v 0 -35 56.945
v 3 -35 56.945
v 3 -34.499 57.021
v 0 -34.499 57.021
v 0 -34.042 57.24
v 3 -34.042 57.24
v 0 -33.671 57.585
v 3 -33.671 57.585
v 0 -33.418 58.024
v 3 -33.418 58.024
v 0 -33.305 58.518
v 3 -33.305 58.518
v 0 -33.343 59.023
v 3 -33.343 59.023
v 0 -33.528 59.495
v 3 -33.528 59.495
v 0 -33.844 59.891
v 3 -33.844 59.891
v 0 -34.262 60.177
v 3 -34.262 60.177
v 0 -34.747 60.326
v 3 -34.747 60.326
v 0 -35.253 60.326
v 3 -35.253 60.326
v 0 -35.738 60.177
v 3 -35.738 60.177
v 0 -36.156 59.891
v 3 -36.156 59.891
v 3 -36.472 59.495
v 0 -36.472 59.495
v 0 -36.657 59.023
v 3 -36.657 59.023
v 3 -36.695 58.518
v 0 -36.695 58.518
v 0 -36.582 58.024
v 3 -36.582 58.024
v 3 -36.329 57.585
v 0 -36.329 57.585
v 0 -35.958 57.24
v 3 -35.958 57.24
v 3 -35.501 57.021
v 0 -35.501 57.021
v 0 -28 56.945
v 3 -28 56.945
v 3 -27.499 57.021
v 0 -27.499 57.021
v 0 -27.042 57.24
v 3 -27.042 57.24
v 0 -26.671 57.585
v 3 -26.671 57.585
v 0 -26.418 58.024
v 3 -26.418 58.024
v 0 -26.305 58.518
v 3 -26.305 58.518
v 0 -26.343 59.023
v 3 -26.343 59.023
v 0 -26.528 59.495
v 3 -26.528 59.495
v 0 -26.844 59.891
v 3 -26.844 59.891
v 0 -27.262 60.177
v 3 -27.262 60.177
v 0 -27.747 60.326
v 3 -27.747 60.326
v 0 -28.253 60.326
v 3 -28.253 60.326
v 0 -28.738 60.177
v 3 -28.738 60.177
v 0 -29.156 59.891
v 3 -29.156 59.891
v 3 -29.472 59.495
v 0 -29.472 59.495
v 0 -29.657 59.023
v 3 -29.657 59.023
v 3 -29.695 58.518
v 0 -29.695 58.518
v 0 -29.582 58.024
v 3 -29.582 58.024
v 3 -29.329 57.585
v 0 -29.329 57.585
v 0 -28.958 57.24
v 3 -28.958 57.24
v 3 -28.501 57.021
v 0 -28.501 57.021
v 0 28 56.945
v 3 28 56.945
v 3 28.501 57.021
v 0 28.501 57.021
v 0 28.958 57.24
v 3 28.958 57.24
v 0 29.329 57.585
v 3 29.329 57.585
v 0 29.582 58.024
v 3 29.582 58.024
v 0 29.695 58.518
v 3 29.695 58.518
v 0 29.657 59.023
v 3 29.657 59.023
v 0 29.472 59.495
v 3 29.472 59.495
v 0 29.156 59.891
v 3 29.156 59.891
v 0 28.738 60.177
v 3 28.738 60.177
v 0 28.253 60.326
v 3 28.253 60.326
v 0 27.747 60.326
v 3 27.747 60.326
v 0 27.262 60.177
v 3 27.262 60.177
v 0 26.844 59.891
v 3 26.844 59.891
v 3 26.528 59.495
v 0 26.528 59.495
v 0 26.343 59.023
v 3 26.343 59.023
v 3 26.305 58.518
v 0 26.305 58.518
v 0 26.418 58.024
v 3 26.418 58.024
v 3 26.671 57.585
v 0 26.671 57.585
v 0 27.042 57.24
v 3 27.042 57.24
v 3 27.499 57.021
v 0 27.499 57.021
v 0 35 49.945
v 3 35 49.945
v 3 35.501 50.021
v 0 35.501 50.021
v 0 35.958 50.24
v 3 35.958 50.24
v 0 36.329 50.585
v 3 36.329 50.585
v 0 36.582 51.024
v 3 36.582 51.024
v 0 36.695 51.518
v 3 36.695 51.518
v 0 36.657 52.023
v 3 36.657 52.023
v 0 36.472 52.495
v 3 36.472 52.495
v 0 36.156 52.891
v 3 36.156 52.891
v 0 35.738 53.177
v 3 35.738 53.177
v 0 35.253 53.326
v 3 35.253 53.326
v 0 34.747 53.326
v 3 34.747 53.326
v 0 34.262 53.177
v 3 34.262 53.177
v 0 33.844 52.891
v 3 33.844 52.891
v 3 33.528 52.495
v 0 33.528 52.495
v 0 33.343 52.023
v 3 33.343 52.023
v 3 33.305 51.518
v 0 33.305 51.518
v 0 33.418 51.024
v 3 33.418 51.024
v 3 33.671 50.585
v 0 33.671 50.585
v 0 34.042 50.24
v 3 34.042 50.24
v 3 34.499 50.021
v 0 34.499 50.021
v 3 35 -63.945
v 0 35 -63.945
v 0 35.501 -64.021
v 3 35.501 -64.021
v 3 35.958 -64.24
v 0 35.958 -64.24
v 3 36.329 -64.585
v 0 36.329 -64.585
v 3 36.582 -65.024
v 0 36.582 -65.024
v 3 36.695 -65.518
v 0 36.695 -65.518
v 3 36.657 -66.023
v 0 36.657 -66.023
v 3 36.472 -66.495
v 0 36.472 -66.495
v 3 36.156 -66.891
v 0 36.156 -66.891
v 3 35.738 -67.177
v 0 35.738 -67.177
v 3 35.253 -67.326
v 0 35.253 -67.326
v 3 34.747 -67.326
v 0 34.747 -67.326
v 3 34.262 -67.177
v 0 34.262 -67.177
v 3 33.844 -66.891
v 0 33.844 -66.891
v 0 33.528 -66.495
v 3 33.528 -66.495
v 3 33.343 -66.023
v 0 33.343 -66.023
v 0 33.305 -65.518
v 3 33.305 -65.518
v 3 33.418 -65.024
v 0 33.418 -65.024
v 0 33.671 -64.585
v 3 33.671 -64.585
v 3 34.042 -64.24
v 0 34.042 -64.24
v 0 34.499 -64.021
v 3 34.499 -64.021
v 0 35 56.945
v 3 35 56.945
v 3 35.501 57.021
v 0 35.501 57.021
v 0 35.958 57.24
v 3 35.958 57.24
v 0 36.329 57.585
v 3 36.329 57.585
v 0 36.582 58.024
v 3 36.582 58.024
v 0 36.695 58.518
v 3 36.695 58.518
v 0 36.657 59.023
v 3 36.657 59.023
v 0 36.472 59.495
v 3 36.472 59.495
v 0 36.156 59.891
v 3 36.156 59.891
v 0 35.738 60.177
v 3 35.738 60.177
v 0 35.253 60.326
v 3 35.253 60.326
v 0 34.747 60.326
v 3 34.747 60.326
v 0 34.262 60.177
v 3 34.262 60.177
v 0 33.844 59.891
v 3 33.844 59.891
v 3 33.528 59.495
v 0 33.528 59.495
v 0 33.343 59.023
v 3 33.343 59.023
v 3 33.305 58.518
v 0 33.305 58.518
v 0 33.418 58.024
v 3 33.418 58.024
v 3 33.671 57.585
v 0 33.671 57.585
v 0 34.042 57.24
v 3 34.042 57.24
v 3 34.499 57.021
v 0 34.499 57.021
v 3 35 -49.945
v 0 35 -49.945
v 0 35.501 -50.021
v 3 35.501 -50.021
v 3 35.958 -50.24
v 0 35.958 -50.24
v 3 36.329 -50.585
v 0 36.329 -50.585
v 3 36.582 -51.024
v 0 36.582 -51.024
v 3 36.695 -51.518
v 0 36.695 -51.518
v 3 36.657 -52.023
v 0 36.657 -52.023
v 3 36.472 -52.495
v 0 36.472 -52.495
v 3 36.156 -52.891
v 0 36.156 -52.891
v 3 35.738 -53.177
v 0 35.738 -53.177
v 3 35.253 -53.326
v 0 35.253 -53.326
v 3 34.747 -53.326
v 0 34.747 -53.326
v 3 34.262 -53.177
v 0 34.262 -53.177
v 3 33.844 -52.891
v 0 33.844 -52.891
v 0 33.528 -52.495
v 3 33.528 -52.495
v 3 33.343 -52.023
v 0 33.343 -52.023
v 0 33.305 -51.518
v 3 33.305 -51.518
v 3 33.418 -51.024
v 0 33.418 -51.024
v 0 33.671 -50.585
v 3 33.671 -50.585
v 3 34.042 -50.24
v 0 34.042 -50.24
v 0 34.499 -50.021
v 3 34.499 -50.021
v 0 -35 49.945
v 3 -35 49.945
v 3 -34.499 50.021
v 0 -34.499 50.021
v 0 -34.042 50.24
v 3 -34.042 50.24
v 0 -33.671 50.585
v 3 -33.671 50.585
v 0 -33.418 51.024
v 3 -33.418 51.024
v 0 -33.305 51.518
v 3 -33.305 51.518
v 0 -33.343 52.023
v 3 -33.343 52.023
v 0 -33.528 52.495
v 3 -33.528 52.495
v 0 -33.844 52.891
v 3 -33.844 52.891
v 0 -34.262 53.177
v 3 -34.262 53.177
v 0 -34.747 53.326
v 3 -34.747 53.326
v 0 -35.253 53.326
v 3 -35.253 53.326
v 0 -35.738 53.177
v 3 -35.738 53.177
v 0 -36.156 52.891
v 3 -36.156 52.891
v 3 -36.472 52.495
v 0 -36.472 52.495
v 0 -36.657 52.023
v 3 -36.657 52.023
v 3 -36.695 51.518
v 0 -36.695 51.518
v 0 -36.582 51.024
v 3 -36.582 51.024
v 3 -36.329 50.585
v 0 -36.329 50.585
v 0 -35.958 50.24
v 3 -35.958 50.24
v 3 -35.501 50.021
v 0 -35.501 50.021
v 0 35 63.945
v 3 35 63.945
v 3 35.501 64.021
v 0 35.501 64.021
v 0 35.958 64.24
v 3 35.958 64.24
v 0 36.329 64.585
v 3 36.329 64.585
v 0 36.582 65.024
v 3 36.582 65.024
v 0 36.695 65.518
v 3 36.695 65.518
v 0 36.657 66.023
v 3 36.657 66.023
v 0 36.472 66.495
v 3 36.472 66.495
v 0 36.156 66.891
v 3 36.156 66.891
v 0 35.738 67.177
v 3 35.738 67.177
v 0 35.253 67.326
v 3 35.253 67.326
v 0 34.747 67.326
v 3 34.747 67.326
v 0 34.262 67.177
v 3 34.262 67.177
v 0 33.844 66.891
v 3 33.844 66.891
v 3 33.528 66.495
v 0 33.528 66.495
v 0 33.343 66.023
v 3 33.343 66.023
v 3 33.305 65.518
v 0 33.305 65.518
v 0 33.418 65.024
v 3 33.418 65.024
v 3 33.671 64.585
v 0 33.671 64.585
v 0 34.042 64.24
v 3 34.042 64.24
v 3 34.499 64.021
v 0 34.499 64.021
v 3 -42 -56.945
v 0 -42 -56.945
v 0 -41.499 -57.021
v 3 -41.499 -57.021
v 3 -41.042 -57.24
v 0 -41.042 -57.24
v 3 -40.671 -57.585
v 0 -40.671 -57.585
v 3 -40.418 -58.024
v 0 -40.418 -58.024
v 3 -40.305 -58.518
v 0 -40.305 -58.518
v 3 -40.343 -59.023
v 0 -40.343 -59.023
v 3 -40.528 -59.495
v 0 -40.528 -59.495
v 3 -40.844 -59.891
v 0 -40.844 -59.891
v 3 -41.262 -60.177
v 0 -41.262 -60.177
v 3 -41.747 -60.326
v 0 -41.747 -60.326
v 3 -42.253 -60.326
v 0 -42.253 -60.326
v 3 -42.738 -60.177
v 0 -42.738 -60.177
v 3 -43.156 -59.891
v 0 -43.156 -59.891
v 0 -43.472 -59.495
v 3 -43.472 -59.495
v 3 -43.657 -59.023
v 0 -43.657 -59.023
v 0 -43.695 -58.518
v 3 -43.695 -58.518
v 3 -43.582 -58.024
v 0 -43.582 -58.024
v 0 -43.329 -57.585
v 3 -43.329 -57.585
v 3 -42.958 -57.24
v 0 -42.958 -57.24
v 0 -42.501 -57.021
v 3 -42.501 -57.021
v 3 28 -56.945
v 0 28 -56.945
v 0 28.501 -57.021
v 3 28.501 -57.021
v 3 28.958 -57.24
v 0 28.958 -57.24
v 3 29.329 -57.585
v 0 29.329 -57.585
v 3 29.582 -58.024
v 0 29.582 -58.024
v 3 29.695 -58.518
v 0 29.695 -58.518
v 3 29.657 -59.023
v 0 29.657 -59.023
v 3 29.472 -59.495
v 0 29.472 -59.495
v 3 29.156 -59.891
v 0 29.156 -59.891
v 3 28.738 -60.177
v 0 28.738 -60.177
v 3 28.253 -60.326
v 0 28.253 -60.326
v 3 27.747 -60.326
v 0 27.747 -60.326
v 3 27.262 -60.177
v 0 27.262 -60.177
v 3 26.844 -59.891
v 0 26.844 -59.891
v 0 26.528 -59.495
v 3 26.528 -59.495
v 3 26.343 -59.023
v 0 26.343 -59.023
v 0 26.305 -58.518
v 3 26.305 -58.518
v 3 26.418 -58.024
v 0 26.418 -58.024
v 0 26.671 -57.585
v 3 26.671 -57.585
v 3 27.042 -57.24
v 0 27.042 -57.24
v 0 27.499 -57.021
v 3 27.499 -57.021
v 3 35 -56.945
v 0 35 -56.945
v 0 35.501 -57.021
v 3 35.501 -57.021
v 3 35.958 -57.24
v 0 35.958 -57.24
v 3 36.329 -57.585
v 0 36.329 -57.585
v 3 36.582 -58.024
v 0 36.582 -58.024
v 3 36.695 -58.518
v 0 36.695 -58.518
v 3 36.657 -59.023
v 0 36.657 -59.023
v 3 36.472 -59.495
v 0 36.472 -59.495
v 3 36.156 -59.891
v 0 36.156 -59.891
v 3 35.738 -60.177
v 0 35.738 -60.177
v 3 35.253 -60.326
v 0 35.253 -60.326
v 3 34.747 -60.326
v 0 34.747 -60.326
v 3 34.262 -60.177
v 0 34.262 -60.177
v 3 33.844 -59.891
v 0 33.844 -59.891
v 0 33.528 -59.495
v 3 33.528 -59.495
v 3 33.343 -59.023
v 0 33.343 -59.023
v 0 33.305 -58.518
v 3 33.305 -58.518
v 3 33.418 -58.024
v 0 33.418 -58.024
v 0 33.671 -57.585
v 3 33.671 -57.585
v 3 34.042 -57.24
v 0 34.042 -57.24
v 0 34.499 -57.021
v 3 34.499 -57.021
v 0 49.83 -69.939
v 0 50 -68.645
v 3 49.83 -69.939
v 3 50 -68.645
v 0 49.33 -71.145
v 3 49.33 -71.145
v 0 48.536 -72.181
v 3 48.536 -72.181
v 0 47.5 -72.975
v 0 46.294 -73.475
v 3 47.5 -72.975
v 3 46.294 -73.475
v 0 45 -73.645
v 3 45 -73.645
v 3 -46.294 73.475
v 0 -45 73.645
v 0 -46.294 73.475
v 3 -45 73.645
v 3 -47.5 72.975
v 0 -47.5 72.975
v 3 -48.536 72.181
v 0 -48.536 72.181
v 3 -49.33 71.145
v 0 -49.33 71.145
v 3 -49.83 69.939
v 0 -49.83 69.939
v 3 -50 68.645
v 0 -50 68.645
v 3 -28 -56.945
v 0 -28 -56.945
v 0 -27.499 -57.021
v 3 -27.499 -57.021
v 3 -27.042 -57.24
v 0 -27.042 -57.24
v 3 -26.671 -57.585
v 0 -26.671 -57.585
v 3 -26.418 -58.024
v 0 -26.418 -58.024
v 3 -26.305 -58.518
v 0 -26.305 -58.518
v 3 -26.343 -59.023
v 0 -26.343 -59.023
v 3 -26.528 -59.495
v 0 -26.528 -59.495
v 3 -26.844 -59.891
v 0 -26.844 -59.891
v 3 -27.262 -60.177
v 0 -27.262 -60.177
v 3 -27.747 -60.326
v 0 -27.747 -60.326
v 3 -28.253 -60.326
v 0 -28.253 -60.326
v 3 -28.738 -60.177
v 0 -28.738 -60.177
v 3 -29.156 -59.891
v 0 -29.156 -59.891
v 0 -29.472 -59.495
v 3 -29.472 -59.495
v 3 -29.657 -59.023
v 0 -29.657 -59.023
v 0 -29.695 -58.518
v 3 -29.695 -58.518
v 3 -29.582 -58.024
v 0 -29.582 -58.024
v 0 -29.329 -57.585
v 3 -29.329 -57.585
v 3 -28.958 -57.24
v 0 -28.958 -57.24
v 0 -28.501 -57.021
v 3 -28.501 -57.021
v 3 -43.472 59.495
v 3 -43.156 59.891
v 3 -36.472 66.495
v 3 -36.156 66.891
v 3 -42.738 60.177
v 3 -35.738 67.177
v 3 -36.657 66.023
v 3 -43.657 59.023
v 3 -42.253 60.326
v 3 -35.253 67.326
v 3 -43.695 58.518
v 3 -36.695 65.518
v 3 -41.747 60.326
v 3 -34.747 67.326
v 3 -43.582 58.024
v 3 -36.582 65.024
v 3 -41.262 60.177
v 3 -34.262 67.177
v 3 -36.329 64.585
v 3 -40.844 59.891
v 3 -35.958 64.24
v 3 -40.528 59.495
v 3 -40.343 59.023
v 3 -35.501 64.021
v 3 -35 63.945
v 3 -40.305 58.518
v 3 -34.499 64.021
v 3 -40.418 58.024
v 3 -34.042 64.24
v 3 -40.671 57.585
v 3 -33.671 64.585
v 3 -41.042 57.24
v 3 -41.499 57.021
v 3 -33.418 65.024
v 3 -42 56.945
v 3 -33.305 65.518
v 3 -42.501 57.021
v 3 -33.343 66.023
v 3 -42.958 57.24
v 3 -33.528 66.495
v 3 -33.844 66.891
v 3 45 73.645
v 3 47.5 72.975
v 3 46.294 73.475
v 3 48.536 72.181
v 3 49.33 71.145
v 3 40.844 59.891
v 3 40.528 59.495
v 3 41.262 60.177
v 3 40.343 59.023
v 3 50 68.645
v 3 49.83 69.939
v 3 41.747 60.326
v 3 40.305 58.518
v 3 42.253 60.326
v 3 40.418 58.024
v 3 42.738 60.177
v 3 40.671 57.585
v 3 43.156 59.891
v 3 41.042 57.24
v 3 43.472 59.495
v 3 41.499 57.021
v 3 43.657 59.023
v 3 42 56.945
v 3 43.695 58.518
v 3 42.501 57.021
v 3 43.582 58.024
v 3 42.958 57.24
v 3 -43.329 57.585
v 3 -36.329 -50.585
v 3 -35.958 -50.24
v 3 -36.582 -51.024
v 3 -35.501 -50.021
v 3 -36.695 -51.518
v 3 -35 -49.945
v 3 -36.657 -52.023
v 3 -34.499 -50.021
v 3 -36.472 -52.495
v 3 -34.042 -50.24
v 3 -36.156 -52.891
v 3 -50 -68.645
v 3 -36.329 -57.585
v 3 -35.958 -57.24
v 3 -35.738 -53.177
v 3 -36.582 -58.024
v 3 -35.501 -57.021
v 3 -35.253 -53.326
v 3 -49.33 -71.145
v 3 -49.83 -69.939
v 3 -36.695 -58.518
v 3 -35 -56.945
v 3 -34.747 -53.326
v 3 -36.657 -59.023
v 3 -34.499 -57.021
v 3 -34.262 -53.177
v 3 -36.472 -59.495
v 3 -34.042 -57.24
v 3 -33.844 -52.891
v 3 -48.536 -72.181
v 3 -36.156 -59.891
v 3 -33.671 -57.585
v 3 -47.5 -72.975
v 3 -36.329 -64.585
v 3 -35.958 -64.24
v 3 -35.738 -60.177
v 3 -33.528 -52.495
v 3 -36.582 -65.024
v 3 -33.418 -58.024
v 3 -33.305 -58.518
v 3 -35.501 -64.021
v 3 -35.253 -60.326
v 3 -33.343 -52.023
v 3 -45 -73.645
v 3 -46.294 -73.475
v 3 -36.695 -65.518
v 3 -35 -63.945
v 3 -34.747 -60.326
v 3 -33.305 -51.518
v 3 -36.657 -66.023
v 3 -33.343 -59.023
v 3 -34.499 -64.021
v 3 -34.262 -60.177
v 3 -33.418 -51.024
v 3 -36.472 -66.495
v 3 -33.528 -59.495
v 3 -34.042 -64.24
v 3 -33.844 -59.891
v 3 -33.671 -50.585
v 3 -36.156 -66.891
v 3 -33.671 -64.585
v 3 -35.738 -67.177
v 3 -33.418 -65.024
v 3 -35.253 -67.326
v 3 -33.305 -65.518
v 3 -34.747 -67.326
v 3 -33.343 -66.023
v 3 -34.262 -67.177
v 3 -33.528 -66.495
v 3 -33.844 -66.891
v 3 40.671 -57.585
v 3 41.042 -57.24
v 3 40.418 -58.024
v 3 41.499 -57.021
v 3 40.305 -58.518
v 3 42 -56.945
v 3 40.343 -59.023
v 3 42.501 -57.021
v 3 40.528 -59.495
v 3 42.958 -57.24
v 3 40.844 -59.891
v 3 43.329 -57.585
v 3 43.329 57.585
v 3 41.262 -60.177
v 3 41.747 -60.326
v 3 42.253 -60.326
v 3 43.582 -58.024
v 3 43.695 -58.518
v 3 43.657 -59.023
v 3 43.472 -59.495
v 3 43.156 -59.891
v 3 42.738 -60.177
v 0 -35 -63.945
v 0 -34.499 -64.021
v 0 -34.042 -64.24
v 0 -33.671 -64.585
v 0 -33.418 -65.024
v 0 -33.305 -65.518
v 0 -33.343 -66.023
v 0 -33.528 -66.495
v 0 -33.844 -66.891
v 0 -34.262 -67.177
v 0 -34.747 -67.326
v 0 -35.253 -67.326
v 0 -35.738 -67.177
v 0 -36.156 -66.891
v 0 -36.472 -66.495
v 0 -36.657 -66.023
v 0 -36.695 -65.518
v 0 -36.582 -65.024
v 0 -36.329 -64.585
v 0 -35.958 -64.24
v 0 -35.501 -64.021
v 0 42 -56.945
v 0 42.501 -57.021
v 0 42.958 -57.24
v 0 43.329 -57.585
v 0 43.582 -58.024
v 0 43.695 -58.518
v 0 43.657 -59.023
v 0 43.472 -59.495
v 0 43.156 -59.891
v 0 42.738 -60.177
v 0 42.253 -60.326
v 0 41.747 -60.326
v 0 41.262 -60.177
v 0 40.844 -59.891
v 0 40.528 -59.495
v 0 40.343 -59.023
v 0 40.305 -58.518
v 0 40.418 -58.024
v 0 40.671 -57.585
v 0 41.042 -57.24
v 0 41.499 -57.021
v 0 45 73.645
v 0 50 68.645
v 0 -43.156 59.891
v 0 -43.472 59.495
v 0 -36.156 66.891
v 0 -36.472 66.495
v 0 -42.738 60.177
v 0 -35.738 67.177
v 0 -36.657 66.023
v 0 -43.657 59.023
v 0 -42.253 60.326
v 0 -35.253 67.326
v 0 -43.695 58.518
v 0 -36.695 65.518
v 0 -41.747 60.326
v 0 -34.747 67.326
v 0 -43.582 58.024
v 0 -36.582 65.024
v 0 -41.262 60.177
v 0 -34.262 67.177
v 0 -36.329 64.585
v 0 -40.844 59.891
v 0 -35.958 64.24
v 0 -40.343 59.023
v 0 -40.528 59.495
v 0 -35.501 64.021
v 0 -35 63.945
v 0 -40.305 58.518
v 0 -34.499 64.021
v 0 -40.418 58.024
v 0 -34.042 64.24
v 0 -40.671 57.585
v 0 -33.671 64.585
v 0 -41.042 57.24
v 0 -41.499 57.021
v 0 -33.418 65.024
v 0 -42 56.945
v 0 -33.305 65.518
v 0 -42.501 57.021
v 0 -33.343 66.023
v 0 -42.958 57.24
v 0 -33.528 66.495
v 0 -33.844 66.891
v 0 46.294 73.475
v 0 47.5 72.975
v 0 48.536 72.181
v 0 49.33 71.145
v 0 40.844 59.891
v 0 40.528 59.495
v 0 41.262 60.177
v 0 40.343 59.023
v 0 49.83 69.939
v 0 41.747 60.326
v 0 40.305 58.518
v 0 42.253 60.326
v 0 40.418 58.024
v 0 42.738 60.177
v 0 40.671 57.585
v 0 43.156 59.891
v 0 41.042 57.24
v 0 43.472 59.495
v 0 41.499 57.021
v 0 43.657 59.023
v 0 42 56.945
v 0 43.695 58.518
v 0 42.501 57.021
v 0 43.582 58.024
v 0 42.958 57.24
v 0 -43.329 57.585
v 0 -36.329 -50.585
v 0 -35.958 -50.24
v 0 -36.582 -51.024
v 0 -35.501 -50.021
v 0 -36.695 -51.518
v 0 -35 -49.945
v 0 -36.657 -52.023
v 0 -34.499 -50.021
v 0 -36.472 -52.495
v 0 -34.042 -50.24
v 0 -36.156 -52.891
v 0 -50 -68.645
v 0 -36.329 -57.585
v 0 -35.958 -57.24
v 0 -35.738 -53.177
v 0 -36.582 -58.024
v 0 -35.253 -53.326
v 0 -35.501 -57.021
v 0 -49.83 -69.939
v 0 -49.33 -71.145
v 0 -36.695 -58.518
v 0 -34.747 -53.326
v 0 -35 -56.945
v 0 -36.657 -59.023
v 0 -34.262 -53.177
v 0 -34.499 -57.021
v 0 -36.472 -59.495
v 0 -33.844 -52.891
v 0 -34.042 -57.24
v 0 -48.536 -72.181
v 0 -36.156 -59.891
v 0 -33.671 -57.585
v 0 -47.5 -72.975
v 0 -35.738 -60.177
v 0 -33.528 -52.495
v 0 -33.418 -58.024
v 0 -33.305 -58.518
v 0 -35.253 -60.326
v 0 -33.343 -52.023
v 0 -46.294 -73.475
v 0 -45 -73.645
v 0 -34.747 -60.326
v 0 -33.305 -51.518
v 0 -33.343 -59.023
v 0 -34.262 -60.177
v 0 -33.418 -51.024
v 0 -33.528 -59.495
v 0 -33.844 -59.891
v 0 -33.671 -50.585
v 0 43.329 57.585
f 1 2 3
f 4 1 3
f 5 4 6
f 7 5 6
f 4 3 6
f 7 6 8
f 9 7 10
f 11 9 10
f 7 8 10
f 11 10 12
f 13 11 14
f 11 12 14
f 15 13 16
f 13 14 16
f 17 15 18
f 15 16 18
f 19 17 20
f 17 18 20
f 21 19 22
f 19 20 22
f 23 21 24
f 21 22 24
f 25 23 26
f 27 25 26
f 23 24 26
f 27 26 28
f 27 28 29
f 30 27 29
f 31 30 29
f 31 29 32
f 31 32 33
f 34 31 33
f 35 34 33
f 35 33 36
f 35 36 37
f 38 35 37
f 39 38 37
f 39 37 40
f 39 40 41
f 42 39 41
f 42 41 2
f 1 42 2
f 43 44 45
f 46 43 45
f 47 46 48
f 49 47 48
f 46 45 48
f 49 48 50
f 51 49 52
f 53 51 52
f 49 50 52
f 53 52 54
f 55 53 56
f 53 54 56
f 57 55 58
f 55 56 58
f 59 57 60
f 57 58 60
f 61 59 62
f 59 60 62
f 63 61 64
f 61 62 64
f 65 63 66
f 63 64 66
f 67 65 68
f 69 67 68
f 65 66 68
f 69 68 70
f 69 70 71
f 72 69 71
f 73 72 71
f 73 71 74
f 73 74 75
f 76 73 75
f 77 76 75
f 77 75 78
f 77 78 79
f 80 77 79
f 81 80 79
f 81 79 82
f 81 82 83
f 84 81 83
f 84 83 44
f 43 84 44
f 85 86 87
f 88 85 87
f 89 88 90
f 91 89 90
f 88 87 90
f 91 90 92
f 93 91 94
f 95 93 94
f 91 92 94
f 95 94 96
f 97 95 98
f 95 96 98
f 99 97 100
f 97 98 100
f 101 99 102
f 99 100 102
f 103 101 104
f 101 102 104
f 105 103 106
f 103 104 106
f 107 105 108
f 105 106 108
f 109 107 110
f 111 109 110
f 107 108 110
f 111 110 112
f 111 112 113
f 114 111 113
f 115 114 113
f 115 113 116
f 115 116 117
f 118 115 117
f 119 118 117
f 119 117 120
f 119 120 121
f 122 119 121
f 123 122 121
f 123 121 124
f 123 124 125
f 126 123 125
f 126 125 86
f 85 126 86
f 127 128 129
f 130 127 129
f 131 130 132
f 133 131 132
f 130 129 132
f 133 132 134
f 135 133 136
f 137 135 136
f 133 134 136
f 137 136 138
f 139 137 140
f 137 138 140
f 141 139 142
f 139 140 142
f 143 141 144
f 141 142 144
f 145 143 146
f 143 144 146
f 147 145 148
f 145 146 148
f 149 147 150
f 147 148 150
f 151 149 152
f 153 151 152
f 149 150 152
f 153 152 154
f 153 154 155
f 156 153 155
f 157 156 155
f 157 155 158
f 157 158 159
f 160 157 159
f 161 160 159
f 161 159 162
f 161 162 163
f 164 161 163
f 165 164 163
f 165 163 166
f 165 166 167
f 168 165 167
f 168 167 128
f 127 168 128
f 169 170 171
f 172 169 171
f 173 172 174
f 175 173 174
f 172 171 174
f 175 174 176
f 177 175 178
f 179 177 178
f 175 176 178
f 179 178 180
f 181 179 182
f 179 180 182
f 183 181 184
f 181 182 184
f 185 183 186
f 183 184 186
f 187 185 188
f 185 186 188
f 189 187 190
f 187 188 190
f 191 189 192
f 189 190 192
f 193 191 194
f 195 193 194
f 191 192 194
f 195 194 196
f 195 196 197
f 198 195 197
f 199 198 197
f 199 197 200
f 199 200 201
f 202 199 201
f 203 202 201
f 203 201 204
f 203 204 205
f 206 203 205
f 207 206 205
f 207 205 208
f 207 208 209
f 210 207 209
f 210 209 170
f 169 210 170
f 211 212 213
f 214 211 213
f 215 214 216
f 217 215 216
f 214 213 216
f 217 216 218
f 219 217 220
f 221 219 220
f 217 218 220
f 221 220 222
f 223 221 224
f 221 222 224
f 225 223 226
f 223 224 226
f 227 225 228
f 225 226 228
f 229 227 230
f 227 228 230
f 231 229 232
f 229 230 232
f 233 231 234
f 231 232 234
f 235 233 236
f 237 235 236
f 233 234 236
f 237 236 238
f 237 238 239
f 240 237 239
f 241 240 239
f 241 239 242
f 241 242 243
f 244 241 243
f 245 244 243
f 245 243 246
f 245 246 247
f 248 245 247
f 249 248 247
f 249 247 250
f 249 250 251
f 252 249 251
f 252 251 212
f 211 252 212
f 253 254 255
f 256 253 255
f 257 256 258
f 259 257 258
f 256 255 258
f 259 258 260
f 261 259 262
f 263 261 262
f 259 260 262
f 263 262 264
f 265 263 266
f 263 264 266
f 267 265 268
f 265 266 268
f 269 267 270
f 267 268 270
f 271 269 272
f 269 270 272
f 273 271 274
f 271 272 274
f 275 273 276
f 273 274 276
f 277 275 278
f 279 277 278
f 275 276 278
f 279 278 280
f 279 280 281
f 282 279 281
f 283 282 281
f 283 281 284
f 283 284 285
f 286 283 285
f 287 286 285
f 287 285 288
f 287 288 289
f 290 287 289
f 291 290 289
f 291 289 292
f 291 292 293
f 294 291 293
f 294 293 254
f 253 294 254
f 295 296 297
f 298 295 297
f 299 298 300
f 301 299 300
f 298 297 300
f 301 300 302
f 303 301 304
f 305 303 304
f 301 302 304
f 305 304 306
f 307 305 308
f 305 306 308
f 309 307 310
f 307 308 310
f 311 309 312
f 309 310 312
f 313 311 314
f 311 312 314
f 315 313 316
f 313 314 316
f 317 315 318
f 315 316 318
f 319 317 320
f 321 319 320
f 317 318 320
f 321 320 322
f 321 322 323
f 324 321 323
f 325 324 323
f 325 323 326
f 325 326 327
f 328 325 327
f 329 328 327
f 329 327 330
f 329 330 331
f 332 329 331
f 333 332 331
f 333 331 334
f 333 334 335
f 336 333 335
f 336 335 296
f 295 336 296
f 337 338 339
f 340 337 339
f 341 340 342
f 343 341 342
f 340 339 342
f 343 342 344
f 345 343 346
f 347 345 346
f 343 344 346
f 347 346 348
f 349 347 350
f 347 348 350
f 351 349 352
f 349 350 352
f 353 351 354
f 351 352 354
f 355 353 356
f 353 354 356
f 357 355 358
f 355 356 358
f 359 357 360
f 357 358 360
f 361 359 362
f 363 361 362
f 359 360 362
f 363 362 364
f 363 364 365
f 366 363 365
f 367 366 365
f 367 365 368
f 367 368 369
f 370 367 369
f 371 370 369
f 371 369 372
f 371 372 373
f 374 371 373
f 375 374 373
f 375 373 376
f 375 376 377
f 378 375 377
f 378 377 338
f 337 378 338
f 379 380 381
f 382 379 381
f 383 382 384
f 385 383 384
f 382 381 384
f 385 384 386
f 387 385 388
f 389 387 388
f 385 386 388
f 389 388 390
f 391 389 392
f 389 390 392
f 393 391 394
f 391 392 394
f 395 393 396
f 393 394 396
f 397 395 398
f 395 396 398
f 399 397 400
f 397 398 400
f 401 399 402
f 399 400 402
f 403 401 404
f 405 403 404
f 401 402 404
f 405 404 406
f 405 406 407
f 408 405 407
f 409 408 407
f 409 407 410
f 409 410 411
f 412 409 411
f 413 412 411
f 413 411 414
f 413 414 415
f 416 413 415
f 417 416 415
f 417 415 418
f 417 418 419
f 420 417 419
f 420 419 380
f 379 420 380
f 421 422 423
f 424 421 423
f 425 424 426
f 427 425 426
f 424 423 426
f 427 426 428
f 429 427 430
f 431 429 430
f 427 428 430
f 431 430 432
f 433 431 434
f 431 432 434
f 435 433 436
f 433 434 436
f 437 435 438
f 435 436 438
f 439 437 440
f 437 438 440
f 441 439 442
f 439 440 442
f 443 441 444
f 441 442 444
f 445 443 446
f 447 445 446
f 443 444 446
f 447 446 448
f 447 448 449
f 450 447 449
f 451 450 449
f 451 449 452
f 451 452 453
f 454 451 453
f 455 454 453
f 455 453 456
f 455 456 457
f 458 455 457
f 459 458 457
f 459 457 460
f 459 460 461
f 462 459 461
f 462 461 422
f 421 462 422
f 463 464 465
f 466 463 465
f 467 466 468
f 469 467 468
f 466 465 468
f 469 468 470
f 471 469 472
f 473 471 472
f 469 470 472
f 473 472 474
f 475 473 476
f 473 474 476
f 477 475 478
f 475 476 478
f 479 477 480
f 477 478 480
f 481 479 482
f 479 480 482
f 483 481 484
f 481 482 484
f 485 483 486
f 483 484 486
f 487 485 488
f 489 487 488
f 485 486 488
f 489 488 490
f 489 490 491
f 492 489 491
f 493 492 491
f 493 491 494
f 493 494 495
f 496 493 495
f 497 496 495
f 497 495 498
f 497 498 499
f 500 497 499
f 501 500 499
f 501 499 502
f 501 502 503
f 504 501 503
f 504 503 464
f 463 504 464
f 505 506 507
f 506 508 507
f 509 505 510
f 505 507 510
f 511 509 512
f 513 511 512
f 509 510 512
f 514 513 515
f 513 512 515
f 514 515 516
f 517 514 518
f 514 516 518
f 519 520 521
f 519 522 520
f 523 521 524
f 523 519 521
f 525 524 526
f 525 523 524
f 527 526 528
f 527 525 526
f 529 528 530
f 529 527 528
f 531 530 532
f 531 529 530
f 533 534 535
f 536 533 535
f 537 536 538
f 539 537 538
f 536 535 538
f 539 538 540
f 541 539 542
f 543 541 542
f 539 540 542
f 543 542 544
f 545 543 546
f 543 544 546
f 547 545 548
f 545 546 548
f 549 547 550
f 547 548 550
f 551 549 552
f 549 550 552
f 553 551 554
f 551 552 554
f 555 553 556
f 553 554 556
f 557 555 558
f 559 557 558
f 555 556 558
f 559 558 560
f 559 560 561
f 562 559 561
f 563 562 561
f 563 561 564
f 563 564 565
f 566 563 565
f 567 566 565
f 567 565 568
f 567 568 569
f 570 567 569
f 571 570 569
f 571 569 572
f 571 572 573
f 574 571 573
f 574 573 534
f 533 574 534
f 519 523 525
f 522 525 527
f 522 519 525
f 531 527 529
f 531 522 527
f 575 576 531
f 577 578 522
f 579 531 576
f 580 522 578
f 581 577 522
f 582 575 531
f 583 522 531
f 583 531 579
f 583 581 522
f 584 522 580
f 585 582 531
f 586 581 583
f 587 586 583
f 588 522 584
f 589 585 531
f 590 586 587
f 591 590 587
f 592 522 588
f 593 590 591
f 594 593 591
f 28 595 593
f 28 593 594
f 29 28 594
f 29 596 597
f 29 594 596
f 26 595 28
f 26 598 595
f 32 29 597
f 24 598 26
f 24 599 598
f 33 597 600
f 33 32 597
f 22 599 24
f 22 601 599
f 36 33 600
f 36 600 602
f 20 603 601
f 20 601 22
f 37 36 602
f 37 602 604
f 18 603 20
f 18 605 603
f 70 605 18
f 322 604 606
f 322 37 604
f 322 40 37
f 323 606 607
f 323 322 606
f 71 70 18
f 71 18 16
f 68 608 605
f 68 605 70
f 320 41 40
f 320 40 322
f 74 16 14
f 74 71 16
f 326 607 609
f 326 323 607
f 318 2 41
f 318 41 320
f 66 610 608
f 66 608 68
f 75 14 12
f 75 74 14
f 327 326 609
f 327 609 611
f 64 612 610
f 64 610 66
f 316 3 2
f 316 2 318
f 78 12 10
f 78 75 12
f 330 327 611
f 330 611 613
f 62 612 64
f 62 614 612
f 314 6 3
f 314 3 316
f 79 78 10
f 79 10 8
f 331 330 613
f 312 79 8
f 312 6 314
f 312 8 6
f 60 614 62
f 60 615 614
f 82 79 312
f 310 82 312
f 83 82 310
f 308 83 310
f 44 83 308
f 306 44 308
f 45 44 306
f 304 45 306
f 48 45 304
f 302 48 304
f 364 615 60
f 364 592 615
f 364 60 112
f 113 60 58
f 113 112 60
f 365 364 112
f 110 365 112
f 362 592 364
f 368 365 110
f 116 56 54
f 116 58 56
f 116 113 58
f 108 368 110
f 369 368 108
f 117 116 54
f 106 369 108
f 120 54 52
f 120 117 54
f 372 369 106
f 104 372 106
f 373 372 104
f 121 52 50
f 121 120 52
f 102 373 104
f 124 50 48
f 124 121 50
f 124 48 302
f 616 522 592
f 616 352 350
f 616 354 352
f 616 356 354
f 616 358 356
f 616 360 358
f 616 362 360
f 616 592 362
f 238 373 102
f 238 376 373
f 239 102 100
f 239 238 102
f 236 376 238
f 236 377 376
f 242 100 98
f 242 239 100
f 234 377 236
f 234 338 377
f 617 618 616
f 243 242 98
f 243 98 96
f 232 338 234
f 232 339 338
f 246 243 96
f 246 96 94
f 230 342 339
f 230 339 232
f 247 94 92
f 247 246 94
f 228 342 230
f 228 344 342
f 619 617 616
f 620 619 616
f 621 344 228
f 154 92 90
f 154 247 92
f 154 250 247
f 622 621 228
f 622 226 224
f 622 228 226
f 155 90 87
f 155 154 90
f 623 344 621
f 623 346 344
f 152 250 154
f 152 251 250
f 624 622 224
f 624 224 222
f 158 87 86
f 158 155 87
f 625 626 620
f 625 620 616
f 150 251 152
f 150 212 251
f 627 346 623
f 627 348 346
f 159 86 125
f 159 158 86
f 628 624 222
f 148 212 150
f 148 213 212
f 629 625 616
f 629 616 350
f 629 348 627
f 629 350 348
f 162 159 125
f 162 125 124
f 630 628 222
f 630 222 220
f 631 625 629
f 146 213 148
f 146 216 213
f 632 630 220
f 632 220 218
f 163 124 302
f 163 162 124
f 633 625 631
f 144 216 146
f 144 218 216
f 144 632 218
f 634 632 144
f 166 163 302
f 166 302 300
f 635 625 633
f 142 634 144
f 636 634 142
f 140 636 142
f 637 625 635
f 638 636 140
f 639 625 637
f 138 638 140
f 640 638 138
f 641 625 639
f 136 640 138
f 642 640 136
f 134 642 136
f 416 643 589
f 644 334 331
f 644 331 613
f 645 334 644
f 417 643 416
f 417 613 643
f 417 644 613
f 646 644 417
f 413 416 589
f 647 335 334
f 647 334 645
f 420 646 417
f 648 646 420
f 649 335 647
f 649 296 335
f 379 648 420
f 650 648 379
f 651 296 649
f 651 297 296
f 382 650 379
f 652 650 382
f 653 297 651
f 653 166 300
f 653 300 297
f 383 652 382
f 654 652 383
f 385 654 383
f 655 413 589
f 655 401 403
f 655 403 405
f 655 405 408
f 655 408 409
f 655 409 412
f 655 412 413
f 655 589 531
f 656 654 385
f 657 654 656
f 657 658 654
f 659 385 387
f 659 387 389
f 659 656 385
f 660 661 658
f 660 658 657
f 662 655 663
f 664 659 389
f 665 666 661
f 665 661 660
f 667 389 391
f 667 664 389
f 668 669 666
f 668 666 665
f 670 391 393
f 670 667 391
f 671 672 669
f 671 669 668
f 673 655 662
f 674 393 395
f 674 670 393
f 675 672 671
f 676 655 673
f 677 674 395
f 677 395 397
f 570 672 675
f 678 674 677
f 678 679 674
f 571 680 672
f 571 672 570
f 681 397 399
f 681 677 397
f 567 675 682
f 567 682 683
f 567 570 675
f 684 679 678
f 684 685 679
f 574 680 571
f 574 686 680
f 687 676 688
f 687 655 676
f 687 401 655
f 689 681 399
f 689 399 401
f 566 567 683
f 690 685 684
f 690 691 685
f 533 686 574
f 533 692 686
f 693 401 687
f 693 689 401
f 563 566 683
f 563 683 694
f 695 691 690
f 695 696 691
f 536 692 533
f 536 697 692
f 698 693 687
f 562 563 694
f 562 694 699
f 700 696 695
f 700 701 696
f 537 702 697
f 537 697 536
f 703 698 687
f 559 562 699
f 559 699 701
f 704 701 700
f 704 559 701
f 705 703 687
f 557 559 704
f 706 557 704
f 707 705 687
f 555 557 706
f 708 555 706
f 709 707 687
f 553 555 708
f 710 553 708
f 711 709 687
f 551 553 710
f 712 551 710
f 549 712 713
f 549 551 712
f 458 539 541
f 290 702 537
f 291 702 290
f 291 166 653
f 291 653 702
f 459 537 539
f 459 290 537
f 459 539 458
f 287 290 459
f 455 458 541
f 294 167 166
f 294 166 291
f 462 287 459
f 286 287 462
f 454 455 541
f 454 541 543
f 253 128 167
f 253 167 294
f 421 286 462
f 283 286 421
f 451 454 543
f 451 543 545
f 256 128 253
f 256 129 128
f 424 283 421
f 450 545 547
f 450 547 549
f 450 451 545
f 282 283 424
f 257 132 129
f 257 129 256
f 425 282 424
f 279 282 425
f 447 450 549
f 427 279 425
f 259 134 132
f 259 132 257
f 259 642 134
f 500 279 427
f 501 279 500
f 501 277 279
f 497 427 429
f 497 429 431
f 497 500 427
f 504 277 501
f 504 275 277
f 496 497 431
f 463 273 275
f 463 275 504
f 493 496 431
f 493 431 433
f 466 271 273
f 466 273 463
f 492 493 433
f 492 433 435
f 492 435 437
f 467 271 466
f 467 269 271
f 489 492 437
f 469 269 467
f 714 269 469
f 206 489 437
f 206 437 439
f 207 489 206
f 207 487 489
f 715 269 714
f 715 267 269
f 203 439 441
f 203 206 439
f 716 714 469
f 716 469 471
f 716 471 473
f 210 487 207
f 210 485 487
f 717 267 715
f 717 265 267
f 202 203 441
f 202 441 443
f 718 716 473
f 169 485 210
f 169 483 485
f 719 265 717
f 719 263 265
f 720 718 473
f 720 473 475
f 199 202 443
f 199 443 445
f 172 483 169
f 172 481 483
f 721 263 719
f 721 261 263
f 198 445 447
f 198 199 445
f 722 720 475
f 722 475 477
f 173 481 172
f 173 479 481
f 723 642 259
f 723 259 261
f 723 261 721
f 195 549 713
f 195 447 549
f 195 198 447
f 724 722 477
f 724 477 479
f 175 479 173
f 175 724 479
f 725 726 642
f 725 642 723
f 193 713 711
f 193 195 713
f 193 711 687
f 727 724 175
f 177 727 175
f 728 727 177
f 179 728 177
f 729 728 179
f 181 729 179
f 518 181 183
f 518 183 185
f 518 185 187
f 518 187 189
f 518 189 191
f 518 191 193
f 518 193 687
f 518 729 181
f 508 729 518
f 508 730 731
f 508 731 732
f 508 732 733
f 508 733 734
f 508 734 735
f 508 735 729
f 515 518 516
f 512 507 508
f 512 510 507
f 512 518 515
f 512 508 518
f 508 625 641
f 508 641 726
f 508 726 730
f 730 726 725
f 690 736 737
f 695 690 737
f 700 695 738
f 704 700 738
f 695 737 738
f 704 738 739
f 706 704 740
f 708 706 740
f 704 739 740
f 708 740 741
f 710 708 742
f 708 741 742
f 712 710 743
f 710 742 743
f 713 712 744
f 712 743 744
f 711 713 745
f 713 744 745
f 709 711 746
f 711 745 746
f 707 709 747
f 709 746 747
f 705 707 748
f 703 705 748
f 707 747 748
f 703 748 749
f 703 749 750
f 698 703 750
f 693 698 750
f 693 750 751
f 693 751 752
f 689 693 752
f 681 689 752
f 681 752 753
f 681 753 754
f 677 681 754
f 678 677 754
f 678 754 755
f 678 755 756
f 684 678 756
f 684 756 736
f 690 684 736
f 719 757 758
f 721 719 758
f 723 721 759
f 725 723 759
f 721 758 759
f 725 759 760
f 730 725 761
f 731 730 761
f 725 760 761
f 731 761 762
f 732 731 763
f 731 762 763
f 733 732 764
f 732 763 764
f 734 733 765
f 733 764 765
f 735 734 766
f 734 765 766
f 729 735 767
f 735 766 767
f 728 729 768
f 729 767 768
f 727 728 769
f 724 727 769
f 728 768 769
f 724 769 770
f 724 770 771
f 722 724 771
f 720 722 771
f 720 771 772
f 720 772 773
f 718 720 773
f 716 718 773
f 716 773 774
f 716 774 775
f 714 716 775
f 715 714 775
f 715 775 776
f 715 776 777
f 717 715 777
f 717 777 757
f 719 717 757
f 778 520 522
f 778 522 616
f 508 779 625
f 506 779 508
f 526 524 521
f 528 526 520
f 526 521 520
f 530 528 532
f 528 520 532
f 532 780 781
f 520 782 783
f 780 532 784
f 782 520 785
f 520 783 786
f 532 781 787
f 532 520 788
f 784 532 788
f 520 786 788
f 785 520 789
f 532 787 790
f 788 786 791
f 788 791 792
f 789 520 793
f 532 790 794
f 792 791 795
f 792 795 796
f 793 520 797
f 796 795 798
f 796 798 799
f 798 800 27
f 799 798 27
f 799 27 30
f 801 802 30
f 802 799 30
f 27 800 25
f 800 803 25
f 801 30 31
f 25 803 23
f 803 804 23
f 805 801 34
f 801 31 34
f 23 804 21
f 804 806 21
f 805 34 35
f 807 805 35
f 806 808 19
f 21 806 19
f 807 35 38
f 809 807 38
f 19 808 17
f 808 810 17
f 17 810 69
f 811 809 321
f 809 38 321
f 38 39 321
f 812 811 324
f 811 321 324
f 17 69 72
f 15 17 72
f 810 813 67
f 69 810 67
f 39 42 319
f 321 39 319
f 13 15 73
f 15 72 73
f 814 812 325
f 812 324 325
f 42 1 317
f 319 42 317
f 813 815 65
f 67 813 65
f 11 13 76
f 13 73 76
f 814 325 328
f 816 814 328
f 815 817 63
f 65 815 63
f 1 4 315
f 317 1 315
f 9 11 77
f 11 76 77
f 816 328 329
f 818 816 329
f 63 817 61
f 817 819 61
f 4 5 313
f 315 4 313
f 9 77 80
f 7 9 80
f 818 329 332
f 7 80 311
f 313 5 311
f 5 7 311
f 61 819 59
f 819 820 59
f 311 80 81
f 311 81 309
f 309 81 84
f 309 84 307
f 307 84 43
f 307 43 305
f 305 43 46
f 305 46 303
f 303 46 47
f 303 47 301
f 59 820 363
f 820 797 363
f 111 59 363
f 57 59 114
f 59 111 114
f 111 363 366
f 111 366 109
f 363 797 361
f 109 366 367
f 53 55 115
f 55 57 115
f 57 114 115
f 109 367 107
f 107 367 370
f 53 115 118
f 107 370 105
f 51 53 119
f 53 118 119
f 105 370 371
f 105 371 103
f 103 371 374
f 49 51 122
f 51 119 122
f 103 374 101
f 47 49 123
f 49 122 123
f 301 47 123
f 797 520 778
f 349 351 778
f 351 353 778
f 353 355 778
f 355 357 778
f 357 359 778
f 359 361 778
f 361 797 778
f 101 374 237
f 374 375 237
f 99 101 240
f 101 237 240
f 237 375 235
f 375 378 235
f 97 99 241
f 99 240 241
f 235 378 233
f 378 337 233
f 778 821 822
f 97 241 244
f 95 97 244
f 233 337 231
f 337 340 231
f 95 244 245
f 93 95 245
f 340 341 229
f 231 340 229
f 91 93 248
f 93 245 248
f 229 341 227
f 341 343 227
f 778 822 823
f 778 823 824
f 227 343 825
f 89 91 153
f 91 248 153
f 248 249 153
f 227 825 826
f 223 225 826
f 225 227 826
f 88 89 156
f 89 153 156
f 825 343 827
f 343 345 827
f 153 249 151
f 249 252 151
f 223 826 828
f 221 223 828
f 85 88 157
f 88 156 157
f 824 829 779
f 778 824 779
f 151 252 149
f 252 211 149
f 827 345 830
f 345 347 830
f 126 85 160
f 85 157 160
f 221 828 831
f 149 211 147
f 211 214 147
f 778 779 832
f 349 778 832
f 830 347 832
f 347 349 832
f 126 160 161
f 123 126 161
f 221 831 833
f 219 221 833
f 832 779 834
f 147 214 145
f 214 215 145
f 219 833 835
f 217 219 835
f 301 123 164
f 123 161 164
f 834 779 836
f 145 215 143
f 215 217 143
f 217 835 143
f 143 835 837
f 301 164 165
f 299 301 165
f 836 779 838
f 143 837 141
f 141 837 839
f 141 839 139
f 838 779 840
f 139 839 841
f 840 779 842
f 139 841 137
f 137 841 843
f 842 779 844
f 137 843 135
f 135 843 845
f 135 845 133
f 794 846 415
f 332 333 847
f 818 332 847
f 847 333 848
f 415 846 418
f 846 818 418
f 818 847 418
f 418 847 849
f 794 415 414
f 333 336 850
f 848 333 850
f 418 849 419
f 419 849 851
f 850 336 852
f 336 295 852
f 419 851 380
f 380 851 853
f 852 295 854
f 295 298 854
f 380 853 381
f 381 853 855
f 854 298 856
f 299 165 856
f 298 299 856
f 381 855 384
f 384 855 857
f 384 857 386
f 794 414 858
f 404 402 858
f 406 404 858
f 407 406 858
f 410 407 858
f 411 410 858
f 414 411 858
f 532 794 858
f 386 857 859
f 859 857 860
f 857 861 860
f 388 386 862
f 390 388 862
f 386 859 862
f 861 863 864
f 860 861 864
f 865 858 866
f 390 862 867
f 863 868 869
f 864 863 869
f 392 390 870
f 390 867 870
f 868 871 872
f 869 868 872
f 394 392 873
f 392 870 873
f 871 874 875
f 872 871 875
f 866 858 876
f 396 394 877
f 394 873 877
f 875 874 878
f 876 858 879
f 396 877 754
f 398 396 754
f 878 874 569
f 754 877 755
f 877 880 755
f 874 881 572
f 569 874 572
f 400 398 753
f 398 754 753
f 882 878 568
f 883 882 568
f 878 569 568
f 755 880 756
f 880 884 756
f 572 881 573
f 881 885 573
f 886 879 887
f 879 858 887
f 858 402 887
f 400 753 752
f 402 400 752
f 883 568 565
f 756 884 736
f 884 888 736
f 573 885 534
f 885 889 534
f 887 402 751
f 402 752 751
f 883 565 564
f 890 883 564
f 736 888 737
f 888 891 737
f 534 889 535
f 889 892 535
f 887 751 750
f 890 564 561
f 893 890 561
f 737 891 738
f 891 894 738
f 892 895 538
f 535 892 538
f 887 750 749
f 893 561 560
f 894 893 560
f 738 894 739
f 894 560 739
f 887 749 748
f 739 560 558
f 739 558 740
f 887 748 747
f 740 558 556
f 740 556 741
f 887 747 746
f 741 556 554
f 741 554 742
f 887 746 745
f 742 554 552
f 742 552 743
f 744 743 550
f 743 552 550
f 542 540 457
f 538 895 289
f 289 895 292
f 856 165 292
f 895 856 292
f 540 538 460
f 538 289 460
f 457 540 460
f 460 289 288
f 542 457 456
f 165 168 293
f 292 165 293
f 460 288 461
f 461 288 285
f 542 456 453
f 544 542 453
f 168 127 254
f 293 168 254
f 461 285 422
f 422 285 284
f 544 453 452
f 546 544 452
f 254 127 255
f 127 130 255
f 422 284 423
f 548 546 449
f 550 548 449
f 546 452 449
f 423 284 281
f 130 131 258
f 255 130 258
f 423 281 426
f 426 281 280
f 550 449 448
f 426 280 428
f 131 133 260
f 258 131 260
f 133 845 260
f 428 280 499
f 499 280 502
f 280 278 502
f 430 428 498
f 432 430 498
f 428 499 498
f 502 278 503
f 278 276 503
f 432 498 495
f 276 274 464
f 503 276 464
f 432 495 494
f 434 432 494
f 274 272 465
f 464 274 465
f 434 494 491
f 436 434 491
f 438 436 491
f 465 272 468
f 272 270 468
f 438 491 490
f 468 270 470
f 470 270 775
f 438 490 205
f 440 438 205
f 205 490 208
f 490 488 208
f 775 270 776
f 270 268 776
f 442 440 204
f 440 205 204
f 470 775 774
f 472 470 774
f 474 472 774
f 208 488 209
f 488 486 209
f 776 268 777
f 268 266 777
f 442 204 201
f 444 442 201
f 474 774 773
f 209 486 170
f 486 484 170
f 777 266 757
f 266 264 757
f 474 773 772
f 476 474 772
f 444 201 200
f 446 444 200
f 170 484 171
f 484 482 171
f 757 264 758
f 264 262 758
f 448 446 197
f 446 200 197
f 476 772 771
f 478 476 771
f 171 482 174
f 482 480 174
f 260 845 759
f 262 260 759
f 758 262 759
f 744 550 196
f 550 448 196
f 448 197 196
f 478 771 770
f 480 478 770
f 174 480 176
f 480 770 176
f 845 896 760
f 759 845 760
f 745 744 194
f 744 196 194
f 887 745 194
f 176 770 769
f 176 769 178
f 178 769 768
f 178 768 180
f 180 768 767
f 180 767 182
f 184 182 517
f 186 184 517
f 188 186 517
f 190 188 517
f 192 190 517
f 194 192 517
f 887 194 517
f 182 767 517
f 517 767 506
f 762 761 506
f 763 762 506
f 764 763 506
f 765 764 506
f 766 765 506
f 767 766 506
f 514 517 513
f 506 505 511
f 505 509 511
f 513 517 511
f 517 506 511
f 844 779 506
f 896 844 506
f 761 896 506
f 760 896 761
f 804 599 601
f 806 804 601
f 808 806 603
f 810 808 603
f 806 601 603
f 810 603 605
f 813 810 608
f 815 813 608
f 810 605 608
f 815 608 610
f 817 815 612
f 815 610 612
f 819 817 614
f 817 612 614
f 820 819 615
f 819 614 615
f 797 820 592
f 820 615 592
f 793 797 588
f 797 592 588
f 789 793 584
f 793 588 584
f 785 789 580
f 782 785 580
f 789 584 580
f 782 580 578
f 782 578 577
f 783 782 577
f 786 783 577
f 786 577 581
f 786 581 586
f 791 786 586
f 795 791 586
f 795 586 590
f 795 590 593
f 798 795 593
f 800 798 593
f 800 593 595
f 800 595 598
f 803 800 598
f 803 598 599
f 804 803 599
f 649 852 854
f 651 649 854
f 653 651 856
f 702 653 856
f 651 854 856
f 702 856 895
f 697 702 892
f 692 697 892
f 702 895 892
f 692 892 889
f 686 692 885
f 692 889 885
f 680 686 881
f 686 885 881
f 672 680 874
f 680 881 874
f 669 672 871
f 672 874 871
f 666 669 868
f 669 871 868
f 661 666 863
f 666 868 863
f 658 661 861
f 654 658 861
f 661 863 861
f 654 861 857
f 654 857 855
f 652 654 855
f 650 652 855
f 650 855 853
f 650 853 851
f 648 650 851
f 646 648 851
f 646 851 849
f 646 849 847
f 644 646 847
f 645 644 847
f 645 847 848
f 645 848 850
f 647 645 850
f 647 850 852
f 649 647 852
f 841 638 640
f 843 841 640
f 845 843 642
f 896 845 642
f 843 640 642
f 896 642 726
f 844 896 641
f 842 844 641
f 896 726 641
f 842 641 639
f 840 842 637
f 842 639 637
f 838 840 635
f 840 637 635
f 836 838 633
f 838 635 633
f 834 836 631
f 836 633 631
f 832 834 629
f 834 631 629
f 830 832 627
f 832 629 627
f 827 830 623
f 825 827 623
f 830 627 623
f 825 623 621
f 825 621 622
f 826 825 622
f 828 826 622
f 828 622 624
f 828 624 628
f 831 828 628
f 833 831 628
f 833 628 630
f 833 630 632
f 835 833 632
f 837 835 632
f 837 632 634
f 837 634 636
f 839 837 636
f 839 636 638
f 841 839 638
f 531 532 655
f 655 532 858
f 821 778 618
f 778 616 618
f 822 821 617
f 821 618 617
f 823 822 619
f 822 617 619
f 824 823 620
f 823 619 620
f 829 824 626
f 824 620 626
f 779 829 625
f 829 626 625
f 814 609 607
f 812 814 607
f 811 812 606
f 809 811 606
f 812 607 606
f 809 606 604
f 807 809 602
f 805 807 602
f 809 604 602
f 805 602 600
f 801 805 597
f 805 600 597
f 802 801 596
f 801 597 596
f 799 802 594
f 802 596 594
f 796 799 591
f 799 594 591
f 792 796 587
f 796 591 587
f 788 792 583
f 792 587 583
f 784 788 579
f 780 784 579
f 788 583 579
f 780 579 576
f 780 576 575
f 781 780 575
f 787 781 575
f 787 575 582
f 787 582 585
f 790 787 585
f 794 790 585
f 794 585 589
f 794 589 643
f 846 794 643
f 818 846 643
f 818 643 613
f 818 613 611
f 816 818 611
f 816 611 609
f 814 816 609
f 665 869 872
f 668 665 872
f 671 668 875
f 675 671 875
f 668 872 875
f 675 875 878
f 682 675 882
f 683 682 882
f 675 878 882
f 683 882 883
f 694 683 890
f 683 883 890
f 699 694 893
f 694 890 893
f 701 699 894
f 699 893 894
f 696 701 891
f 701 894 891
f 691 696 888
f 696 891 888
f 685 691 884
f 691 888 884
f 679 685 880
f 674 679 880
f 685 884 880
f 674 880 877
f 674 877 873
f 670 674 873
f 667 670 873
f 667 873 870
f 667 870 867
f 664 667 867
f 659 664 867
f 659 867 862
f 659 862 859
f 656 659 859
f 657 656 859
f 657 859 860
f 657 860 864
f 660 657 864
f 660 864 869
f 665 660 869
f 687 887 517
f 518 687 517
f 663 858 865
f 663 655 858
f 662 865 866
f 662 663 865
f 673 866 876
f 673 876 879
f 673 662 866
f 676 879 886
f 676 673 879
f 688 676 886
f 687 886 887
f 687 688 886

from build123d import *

# Parameters (mm, degrees)
SKETCH1_W            = 147.29
SKETCH1_H            = 100
BOSS_EXTRUDE1_DEPTH  = 3
M3_CLEARANCE_HOLE2_D = 3.4
M3_CLEARANCE_HOLE3_D = 3.4
FILLET1_R            = 5


with BuildPart() as part:
    # Sketch1 → Boss-Extrude1 (new body)
    with BuildSketch(Plane(origin=(0, 0, 0), x_dir=(0, 0, -1), z_dir=(1, 0, 0))):
        Rectangle(SKETCH1_W, SKETCH1_H)
    extrude(amount=BOSS_EXTRUDE1_DEPTH)

    # M3 Clearance Hole2 (through all)
    with Locations(Plane(origin=(3, 0, 0), x_dir=(0, 0, -1), z_dir=(1, 0, 0))):
        with Locations((58.645, -35), (51.645, -35), (58.645, -28), (65.645, -35), (58.645, -42), (58.645, 35), (58.645, 42), (51.645, 35), (58.645, 28), (65.645, 35)):
            Hole(M3_CLEARANCE_HOLE2_D / 2)

    # M3 Clearance Hole3 (through all)
    with Locations(Plane.ZY):
        with Locations((58.645, 35), (58.645, 42), (65.645, 35), (58.645, 28), (51.645, 35), (58.645, -35), (58.645, -28), (65.645, -35), (58.645, -42), (51.645, -35)):
            Hole(M3_CLEARANCE_HOLE3_D / 2)

    # Fillet1
    fillet1_edges = [part.edges().sort_by_distance(p)[0] for p in [
        (1.5, -50, -73.645),
        (1.5, -50, 73.645),
        (1.5, 50, 73.645),
        (1.5, 50, -73.645),
    ]]
    fillet(fillet1_edges, radius=FILLET1_R)


solid = part.part
